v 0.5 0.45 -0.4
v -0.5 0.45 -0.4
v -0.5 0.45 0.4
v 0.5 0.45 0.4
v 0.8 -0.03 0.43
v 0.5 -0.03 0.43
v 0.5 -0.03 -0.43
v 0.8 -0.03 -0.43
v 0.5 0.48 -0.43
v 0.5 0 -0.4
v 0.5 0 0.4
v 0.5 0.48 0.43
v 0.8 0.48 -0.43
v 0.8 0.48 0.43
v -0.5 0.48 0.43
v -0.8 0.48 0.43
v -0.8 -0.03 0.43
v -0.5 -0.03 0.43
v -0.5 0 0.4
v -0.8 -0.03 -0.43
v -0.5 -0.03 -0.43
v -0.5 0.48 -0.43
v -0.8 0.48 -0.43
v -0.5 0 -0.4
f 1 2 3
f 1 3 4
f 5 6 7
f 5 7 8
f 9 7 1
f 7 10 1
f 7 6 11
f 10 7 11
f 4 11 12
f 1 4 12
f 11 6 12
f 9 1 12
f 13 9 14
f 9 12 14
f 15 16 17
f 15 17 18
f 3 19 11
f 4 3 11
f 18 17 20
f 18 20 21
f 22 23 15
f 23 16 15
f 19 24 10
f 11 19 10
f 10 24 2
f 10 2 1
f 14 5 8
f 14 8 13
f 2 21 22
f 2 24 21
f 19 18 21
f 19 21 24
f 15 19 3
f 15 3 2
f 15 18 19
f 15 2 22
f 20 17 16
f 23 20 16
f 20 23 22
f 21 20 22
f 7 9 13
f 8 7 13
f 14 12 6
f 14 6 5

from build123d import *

# Parameters (mm, degrees)
SKETCH1_W           = 1.6
SKETCH1_H           = 0.8
EXTRUDE1_DEPTH      = 0.45
SKETCH2_W           = 0.3
SKETCH2_H           = 0.51
EXTRUDE2_DEPTH      = 0.43
EXTRUDE2_DEPTH_BACK = 0.43


with BuildPart() as part:
    # Sketch1 → Extrude1 (new body)
    with BuildSketch(Plane(origin=(0, 0, 0), x_dir=(1, 0, 0), z_dir=(0, 1, 0))):
        Rectangle(SKETCH1_W, SKETCH1_H)
    extrude(amount=EXTRUDE1_DEPTH)

    # Sketch2 → Extrude2 (add, two sides)
    with BuildSketch(Plane.XY) as extrude2_sk:
        with Locations((-0.65, 0.225)):
            Rectangle(SKETCH2_W, SKETCH2_H)
        with Locations((0.65, 0.225)):
            Rectangle(SKETCH2_W, SKETCH2_H)
    extrude(amount=EXTRUDE2_DEPTH)
    extrude(extrude2_sk.sketch, amount=-EXTRUDE2_DEPTH_BACK)


solid = part.part
